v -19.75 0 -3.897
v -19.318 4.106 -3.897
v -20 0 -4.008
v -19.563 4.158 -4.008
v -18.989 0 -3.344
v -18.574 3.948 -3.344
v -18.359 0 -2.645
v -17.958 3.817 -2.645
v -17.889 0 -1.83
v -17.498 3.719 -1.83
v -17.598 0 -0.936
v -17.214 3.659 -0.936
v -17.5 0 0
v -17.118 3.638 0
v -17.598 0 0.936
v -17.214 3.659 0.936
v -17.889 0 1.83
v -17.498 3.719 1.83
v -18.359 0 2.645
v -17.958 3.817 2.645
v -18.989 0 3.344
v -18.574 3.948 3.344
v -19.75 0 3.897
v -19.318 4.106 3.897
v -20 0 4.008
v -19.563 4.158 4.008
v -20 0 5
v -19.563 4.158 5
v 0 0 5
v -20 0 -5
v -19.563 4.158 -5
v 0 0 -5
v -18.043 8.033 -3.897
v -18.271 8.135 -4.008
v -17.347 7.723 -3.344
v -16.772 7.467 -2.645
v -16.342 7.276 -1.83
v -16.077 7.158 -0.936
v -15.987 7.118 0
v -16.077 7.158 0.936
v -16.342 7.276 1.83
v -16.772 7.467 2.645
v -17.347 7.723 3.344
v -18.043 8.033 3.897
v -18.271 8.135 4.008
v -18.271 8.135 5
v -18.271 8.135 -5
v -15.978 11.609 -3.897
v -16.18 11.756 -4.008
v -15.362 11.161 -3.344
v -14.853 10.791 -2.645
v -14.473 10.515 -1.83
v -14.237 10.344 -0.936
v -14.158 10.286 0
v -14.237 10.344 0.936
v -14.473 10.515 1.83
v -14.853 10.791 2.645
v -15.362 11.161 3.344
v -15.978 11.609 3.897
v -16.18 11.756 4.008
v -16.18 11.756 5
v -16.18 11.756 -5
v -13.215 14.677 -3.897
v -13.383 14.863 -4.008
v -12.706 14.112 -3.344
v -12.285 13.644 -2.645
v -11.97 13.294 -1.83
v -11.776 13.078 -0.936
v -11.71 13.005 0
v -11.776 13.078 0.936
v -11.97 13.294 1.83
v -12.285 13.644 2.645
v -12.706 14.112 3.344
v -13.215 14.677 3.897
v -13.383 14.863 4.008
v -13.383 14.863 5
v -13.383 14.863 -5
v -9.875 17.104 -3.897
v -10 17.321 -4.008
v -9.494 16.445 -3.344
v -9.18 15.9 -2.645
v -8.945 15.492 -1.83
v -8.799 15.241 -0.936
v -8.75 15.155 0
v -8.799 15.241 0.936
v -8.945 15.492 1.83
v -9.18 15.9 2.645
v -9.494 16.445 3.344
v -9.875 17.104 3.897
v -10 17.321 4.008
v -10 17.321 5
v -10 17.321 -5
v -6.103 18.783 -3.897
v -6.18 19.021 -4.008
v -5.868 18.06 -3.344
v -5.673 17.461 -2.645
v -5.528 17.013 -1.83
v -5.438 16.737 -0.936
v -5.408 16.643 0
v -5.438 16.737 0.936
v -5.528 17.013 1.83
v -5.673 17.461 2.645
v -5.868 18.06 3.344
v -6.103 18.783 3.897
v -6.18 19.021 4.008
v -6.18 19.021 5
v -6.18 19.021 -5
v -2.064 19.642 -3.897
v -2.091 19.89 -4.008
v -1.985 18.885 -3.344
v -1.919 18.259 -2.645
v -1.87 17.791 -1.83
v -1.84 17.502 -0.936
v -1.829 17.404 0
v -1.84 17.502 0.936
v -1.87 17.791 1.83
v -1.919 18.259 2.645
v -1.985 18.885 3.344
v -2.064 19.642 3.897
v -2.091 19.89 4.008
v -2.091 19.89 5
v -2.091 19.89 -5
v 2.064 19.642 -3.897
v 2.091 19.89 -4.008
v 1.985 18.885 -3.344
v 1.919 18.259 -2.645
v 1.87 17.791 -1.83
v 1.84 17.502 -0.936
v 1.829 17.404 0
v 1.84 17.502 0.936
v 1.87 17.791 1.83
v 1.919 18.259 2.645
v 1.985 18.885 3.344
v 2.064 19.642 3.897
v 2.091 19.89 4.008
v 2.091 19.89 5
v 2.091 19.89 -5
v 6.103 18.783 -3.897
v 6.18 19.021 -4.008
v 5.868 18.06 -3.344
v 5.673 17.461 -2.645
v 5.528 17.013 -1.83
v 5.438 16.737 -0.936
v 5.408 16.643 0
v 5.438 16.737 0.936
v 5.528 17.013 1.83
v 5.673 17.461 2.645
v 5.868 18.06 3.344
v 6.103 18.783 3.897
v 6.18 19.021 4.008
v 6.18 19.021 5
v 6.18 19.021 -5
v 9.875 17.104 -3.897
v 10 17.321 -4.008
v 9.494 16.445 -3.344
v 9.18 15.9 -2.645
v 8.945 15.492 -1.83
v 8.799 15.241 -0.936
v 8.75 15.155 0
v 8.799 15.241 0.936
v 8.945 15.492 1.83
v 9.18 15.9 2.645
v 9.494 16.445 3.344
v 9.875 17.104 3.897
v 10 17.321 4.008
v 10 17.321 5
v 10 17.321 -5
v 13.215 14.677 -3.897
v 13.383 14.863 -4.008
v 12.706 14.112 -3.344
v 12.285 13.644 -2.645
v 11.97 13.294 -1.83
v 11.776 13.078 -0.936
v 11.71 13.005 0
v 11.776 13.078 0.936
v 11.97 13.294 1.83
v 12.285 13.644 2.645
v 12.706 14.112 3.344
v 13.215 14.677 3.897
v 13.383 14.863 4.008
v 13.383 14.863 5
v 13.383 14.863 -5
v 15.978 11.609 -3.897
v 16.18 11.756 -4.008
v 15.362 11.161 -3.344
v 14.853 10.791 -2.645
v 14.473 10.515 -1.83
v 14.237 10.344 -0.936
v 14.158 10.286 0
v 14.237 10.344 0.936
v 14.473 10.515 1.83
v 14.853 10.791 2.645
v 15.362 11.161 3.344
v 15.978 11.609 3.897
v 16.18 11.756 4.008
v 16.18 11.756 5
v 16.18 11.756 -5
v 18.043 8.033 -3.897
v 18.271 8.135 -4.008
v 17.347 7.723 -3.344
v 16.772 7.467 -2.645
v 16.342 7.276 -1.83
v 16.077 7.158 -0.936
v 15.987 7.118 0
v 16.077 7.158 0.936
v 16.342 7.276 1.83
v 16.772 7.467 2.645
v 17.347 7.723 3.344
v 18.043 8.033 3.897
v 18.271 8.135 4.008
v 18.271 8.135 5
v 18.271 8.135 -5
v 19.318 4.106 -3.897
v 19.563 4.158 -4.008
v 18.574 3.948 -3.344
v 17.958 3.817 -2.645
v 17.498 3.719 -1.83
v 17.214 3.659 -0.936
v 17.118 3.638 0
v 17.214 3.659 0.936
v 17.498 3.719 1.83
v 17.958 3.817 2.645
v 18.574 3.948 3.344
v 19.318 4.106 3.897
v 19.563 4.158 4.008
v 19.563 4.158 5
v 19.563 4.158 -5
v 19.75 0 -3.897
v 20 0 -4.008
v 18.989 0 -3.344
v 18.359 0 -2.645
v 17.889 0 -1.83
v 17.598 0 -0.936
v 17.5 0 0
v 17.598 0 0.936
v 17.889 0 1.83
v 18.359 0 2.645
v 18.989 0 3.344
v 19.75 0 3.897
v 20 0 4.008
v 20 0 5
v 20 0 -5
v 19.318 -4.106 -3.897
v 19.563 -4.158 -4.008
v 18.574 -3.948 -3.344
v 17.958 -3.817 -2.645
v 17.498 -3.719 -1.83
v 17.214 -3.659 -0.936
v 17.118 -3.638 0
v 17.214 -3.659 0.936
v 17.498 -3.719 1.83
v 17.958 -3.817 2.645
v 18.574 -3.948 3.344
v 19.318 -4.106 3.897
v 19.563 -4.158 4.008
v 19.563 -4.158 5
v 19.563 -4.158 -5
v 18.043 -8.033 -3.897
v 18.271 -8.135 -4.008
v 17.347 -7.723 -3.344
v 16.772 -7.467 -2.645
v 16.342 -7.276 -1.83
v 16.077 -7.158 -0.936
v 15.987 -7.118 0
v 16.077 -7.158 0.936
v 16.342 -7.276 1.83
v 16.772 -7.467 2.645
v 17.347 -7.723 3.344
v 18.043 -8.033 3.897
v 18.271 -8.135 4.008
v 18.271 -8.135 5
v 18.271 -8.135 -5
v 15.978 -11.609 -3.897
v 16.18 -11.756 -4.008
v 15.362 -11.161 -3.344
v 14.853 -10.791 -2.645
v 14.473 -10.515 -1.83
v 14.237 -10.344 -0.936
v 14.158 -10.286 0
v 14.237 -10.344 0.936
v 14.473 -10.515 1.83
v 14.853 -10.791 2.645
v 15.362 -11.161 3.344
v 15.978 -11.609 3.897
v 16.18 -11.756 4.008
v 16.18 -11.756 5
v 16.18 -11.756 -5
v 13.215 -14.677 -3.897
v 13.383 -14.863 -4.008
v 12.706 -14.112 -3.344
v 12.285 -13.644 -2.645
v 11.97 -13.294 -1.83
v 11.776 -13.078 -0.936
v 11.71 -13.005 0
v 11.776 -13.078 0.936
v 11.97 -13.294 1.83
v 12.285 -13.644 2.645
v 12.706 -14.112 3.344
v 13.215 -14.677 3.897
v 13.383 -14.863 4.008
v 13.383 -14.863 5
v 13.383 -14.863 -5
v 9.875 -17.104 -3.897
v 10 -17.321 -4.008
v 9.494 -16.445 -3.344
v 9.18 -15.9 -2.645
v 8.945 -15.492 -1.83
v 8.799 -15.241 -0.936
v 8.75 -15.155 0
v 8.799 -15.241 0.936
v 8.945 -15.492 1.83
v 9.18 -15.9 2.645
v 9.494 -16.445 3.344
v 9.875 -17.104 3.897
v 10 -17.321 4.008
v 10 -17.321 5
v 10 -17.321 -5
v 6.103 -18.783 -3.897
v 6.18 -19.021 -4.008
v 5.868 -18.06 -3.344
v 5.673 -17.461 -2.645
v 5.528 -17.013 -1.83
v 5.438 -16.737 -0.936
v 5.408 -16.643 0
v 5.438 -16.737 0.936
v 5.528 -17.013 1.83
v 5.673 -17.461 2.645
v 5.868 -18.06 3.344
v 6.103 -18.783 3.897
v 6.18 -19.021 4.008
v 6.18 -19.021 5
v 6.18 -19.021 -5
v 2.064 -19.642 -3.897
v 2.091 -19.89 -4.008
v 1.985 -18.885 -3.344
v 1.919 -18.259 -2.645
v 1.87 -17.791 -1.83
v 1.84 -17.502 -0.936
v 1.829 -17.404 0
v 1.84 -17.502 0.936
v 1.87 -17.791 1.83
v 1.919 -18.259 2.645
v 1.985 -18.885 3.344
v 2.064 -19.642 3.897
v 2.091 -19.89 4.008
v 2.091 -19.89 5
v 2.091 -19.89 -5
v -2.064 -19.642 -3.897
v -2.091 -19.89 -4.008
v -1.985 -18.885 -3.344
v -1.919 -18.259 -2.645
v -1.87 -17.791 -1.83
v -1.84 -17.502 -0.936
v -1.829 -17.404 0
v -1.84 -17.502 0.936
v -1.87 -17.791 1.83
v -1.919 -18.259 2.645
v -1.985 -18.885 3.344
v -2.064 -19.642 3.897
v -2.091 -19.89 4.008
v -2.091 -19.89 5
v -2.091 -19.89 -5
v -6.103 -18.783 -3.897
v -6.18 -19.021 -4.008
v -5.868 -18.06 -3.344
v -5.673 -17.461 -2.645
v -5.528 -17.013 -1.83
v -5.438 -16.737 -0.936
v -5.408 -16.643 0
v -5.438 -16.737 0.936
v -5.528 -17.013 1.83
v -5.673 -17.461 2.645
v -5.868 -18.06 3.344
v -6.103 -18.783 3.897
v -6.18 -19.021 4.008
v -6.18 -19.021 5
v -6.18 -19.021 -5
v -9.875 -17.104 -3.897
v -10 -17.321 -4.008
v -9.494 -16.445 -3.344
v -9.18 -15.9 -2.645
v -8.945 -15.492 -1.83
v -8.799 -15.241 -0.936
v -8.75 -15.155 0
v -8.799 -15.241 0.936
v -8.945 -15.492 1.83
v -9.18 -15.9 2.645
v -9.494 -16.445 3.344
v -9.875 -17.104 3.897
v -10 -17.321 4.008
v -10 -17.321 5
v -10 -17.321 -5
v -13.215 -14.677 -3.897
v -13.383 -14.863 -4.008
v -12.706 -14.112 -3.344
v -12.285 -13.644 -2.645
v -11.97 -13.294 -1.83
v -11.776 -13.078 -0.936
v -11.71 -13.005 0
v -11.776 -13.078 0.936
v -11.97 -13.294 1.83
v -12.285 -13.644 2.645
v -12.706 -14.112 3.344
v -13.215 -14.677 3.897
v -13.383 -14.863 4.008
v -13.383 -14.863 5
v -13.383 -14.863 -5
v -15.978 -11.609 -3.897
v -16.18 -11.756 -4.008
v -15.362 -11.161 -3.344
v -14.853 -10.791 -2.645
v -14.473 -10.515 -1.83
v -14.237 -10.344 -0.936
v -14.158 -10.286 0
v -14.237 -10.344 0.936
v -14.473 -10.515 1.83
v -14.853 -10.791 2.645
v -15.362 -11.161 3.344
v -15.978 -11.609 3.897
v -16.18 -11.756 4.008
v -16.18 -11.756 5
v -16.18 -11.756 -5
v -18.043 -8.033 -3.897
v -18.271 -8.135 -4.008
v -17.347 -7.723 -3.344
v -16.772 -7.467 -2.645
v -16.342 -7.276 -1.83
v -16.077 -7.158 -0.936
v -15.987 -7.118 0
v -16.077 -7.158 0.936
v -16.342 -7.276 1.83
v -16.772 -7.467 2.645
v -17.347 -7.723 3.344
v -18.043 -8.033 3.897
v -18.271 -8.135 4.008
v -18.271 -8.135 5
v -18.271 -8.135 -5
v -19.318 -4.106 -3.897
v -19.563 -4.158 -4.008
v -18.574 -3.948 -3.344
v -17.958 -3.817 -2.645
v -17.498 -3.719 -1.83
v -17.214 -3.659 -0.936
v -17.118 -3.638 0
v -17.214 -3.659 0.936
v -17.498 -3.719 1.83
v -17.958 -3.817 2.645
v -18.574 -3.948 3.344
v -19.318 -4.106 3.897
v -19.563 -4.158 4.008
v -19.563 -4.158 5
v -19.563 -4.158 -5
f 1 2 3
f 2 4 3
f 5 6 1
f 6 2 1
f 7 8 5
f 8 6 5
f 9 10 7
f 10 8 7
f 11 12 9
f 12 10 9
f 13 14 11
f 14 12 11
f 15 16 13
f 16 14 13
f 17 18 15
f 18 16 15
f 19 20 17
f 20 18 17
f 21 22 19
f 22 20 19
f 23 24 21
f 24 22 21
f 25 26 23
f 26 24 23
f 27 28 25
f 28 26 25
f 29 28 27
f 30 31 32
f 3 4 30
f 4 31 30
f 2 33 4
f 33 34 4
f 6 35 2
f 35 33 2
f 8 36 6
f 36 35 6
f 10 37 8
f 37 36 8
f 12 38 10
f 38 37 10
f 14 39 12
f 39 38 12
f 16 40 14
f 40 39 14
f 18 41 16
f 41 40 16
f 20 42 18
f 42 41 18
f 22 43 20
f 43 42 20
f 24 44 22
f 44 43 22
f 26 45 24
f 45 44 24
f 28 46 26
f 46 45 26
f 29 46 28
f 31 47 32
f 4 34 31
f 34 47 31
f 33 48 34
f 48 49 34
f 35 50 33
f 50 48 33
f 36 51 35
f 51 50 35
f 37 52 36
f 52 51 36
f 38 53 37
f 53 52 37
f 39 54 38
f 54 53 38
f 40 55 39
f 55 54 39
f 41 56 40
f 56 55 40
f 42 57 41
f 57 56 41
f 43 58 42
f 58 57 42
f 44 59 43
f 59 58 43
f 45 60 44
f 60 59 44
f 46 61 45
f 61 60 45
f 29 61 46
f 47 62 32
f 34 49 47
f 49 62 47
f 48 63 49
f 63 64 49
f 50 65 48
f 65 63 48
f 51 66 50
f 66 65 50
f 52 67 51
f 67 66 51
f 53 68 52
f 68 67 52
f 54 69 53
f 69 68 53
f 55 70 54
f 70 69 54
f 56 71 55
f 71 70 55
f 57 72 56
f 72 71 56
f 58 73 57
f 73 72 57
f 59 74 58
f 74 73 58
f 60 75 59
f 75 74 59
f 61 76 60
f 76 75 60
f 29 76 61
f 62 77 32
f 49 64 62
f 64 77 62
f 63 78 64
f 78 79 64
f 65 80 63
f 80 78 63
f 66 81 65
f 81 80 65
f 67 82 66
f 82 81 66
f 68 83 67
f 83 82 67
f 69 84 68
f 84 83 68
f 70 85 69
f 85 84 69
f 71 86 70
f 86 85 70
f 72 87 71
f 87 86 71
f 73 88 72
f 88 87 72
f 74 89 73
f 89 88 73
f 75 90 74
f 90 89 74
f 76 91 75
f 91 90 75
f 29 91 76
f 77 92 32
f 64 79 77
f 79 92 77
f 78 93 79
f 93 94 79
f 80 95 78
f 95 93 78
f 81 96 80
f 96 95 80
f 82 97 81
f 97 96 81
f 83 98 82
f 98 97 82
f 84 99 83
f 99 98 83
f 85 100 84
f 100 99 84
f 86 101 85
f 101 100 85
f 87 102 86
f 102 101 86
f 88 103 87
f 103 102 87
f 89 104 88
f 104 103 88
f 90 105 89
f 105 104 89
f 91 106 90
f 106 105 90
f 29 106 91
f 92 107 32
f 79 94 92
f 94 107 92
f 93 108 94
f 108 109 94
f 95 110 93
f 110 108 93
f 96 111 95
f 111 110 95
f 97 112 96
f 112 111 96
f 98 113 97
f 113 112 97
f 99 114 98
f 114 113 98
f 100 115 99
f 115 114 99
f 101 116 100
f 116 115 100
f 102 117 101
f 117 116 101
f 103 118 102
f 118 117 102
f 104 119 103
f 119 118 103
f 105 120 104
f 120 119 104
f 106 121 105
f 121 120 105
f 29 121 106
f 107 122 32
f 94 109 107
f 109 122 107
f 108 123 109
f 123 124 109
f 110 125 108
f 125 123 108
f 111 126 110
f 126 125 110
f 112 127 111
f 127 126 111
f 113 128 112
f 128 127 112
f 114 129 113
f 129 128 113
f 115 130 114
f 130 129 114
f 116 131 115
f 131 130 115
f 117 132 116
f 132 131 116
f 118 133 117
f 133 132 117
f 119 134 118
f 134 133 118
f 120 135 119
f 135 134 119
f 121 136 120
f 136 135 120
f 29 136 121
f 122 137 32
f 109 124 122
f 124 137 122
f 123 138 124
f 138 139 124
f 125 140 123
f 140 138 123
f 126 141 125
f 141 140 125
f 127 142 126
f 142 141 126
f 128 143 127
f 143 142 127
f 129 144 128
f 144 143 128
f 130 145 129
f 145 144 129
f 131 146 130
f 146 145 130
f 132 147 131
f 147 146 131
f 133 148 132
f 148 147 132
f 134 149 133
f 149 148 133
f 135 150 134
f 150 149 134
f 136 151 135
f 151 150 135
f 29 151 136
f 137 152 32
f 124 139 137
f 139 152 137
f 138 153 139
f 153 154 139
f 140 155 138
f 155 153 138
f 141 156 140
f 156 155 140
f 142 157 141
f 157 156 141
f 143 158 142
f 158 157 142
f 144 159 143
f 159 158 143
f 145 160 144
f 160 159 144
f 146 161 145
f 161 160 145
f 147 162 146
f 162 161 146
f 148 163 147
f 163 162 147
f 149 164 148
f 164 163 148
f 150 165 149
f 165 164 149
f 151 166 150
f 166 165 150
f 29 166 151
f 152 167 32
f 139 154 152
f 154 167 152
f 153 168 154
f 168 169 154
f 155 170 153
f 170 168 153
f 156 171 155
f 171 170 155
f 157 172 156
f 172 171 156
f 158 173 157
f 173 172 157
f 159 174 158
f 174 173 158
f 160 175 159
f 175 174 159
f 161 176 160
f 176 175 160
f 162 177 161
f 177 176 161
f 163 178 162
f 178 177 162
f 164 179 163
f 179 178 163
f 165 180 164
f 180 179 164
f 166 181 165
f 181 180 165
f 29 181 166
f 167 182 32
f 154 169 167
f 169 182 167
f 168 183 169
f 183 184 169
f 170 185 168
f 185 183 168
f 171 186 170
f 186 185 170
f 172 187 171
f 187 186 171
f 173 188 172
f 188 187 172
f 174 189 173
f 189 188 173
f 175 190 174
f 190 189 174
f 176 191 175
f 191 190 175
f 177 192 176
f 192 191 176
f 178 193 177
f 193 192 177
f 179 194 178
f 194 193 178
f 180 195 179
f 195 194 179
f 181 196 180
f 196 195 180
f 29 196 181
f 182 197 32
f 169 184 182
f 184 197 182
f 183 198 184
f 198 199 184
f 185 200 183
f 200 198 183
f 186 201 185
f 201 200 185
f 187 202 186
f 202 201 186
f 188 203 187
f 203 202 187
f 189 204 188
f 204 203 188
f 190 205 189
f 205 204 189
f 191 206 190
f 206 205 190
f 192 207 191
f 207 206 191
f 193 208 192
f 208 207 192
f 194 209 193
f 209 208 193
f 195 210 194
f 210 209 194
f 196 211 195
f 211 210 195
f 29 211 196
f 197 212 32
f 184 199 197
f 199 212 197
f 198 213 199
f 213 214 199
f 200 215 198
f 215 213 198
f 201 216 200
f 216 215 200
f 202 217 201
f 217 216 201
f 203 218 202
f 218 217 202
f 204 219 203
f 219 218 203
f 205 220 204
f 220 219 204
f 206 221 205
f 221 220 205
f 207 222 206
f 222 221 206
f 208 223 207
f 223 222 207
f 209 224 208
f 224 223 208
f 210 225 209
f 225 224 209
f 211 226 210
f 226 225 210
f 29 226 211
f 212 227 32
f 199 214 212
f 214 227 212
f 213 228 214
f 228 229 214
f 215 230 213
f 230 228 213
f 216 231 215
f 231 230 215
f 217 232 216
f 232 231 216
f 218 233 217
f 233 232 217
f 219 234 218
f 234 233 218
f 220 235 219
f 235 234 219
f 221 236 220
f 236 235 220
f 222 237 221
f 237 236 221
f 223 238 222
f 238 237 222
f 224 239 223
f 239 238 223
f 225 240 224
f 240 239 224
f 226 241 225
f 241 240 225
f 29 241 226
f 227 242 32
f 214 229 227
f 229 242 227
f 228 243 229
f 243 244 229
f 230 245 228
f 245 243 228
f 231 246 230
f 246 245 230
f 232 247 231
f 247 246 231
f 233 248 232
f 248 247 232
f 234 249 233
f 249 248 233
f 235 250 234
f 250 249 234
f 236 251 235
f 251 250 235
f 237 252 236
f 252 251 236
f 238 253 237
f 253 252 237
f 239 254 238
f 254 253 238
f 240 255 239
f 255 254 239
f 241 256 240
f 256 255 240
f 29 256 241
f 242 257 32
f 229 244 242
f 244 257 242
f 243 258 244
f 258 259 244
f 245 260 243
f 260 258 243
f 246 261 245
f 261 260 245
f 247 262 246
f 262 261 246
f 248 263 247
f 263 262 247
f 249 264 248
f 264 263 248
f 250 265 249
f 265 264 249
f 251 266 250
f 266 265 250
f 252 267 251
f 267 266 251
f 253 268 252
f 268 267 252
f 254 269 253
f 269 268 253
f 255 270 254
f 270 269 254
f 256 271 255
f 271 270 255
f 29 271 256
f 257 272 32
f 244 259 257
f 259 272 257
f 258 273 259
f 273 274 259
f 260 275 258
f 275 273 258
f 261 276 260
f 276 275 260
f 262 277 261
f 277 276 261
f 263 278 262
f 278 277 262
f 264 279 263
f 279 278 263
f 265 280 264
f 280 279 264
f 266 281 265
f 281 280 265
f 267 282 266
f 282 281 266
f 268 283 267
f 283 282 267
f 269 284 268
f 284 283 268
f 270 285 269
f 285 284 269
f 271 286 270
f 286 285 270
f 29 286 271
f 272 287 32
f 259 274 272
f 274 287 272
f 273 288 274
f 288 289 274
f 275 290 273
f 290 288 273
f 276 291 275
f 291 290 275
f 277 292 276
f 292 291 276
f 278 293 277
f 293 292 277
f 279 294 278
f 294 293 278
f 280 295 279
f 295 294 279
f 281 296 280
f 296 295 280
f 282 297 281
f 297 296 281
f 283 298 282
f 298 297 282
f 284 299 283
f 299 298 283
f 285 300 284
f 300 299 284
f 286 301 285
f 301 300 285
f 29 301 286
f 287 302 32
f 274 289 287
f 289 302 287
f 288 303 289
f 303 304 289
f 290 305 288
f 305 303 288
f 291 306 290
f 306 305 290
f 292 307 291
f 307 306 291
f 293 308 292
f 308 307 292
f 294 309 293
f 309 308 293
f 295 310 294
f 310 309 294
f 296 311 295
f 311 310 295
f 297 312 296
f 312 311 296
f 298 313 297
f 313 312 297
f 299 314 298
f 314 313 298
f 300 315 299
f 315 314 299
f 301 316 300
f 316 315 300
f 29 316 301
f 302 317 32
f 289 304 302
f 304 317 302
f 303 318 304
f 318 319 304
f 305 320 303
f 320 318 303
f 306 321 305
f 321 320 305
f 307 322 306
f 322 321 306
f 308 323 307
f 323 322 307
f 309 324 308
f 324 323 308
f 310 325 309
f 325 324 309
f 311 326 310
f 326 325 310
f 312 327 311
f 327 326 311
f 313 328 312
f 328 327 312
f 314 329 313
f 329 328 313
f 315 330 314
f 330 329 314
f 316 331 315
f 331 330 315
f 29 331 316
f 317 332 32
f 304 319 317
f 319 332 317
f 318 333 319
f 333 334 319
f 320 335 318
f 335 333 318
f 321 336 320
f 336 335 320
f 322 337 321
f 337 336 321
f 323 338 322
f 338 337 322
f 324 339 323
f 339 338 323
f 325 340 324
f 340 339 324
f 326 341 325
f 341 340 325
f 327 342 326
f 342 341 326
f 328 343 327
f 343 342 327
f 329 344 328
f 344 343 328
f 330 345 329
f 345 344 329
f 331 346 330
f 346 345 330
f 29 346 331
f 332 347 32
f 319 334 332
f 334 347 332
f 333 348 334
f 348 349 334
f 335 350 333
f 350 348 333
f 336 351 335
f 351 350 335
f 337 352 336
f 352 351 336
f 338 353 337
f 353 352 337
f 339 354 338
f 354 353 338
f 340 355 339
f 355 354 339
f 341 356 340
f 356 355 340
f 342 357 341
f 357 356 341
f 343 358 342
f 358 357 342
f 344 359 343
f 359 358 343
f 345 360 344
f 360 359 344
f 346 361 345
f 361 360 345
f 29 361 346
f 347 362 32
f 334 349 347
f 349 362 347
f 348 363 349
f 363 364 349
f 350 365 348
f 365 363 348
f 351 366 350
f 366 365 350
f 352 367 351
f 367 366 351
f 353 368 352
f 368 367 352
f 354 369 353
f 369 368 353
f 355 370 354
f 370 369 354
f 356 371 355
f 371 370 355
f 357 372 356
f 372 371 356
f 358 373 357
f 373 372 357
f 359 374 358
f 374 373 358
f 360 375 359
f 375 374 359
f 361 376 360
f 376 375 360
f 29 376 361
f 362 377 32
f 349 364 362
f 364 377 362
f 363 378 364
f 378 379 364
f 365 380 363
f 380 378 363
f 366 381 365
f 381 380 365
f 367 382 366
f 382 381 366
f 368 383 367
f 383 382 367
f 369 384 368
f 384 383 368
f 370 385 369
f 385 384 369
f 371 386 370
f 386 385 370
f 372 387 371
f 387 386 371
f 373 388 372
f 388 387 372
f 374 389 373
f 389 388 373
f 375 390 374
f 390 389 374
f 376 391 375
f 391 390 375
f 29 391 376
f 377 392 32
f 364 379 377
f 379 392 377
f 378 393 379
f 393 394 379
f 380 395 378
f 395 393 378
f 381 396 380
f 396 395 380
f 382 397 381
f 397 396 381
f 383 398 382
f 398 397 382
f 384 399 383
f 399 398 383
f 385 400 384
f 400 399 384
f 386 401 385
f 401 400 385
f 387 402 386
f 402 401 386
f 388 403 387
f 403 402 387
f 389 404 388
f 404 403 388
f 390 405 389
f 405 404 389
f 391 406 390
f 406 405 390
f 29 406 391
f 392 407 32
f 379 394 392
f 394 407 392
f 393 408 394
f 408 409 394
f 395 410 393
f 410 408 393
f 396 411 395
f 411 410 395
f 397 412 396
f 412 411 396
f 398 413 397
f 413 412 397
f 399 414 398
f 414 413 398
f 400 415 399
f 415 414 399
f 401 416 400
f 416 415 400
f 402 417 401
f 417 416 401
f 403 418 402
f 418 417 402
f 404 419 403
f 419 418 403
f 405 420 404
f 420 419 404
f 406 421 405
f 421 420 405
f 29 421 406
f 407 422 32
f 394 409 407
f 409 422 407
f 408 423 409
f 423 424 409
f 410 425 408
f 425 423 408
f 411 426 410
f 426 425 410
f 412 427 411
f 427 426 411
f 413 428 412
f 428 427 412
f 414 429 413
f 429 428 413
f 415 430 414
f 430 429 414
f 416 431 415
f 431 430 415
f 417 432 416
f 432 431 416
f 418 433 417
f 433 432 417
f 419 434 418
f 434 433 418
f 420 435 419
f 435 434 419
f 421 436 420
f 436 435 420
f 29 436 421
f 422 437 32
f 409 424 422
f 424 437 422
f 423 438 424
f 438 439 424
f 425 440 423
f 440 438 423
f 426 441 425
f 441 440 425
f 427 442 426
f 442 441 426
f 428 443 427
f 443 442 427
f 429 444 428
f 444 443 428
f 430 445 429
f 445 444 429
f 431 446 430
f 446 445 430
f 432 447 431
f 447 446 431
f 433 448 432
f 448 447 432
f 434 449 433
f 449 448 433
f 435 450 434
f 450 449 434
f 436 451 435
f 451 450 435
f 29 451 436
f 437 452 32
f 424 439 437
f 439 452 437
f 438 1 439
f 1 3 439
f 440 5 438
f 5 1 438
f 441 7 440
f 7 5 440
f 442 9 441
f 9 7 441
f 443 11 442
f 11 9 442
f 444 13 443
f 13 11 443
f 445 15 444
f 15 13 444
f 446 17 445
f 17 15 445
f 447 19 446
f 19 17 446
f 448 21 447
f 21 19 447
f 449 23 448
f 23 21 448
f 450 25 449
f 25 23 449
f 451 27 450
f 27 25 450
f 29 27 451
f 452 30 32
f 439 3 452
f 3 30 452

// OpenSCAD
$fn=30;


// dimensions units in mm
servoSplines = 20;
servoDiameter = 5.0; 
slatWidth = 10;
slatDepth = 10;
slatThickness = 2;
hubDiameter = 20;

spread = 0;

// Strategy 
// 1. Core hub + spline core
// 2. Remove slots
// 3. Remove compression slots

// Hub

color("cyan") rotate_extrude() {
    difference(){
        translate([0,-slatWidth/2,0]) square([hubDiameter,slatWidth]);
        translate([hubDiameter+2,0,0]) circle(d=slatWidth-1);
    }
}

translate([hubDiameter-slatDepth,0,spread-slatWidth/2]) rotate([90,0,0])  square([slatDepth,slatWidth]);
